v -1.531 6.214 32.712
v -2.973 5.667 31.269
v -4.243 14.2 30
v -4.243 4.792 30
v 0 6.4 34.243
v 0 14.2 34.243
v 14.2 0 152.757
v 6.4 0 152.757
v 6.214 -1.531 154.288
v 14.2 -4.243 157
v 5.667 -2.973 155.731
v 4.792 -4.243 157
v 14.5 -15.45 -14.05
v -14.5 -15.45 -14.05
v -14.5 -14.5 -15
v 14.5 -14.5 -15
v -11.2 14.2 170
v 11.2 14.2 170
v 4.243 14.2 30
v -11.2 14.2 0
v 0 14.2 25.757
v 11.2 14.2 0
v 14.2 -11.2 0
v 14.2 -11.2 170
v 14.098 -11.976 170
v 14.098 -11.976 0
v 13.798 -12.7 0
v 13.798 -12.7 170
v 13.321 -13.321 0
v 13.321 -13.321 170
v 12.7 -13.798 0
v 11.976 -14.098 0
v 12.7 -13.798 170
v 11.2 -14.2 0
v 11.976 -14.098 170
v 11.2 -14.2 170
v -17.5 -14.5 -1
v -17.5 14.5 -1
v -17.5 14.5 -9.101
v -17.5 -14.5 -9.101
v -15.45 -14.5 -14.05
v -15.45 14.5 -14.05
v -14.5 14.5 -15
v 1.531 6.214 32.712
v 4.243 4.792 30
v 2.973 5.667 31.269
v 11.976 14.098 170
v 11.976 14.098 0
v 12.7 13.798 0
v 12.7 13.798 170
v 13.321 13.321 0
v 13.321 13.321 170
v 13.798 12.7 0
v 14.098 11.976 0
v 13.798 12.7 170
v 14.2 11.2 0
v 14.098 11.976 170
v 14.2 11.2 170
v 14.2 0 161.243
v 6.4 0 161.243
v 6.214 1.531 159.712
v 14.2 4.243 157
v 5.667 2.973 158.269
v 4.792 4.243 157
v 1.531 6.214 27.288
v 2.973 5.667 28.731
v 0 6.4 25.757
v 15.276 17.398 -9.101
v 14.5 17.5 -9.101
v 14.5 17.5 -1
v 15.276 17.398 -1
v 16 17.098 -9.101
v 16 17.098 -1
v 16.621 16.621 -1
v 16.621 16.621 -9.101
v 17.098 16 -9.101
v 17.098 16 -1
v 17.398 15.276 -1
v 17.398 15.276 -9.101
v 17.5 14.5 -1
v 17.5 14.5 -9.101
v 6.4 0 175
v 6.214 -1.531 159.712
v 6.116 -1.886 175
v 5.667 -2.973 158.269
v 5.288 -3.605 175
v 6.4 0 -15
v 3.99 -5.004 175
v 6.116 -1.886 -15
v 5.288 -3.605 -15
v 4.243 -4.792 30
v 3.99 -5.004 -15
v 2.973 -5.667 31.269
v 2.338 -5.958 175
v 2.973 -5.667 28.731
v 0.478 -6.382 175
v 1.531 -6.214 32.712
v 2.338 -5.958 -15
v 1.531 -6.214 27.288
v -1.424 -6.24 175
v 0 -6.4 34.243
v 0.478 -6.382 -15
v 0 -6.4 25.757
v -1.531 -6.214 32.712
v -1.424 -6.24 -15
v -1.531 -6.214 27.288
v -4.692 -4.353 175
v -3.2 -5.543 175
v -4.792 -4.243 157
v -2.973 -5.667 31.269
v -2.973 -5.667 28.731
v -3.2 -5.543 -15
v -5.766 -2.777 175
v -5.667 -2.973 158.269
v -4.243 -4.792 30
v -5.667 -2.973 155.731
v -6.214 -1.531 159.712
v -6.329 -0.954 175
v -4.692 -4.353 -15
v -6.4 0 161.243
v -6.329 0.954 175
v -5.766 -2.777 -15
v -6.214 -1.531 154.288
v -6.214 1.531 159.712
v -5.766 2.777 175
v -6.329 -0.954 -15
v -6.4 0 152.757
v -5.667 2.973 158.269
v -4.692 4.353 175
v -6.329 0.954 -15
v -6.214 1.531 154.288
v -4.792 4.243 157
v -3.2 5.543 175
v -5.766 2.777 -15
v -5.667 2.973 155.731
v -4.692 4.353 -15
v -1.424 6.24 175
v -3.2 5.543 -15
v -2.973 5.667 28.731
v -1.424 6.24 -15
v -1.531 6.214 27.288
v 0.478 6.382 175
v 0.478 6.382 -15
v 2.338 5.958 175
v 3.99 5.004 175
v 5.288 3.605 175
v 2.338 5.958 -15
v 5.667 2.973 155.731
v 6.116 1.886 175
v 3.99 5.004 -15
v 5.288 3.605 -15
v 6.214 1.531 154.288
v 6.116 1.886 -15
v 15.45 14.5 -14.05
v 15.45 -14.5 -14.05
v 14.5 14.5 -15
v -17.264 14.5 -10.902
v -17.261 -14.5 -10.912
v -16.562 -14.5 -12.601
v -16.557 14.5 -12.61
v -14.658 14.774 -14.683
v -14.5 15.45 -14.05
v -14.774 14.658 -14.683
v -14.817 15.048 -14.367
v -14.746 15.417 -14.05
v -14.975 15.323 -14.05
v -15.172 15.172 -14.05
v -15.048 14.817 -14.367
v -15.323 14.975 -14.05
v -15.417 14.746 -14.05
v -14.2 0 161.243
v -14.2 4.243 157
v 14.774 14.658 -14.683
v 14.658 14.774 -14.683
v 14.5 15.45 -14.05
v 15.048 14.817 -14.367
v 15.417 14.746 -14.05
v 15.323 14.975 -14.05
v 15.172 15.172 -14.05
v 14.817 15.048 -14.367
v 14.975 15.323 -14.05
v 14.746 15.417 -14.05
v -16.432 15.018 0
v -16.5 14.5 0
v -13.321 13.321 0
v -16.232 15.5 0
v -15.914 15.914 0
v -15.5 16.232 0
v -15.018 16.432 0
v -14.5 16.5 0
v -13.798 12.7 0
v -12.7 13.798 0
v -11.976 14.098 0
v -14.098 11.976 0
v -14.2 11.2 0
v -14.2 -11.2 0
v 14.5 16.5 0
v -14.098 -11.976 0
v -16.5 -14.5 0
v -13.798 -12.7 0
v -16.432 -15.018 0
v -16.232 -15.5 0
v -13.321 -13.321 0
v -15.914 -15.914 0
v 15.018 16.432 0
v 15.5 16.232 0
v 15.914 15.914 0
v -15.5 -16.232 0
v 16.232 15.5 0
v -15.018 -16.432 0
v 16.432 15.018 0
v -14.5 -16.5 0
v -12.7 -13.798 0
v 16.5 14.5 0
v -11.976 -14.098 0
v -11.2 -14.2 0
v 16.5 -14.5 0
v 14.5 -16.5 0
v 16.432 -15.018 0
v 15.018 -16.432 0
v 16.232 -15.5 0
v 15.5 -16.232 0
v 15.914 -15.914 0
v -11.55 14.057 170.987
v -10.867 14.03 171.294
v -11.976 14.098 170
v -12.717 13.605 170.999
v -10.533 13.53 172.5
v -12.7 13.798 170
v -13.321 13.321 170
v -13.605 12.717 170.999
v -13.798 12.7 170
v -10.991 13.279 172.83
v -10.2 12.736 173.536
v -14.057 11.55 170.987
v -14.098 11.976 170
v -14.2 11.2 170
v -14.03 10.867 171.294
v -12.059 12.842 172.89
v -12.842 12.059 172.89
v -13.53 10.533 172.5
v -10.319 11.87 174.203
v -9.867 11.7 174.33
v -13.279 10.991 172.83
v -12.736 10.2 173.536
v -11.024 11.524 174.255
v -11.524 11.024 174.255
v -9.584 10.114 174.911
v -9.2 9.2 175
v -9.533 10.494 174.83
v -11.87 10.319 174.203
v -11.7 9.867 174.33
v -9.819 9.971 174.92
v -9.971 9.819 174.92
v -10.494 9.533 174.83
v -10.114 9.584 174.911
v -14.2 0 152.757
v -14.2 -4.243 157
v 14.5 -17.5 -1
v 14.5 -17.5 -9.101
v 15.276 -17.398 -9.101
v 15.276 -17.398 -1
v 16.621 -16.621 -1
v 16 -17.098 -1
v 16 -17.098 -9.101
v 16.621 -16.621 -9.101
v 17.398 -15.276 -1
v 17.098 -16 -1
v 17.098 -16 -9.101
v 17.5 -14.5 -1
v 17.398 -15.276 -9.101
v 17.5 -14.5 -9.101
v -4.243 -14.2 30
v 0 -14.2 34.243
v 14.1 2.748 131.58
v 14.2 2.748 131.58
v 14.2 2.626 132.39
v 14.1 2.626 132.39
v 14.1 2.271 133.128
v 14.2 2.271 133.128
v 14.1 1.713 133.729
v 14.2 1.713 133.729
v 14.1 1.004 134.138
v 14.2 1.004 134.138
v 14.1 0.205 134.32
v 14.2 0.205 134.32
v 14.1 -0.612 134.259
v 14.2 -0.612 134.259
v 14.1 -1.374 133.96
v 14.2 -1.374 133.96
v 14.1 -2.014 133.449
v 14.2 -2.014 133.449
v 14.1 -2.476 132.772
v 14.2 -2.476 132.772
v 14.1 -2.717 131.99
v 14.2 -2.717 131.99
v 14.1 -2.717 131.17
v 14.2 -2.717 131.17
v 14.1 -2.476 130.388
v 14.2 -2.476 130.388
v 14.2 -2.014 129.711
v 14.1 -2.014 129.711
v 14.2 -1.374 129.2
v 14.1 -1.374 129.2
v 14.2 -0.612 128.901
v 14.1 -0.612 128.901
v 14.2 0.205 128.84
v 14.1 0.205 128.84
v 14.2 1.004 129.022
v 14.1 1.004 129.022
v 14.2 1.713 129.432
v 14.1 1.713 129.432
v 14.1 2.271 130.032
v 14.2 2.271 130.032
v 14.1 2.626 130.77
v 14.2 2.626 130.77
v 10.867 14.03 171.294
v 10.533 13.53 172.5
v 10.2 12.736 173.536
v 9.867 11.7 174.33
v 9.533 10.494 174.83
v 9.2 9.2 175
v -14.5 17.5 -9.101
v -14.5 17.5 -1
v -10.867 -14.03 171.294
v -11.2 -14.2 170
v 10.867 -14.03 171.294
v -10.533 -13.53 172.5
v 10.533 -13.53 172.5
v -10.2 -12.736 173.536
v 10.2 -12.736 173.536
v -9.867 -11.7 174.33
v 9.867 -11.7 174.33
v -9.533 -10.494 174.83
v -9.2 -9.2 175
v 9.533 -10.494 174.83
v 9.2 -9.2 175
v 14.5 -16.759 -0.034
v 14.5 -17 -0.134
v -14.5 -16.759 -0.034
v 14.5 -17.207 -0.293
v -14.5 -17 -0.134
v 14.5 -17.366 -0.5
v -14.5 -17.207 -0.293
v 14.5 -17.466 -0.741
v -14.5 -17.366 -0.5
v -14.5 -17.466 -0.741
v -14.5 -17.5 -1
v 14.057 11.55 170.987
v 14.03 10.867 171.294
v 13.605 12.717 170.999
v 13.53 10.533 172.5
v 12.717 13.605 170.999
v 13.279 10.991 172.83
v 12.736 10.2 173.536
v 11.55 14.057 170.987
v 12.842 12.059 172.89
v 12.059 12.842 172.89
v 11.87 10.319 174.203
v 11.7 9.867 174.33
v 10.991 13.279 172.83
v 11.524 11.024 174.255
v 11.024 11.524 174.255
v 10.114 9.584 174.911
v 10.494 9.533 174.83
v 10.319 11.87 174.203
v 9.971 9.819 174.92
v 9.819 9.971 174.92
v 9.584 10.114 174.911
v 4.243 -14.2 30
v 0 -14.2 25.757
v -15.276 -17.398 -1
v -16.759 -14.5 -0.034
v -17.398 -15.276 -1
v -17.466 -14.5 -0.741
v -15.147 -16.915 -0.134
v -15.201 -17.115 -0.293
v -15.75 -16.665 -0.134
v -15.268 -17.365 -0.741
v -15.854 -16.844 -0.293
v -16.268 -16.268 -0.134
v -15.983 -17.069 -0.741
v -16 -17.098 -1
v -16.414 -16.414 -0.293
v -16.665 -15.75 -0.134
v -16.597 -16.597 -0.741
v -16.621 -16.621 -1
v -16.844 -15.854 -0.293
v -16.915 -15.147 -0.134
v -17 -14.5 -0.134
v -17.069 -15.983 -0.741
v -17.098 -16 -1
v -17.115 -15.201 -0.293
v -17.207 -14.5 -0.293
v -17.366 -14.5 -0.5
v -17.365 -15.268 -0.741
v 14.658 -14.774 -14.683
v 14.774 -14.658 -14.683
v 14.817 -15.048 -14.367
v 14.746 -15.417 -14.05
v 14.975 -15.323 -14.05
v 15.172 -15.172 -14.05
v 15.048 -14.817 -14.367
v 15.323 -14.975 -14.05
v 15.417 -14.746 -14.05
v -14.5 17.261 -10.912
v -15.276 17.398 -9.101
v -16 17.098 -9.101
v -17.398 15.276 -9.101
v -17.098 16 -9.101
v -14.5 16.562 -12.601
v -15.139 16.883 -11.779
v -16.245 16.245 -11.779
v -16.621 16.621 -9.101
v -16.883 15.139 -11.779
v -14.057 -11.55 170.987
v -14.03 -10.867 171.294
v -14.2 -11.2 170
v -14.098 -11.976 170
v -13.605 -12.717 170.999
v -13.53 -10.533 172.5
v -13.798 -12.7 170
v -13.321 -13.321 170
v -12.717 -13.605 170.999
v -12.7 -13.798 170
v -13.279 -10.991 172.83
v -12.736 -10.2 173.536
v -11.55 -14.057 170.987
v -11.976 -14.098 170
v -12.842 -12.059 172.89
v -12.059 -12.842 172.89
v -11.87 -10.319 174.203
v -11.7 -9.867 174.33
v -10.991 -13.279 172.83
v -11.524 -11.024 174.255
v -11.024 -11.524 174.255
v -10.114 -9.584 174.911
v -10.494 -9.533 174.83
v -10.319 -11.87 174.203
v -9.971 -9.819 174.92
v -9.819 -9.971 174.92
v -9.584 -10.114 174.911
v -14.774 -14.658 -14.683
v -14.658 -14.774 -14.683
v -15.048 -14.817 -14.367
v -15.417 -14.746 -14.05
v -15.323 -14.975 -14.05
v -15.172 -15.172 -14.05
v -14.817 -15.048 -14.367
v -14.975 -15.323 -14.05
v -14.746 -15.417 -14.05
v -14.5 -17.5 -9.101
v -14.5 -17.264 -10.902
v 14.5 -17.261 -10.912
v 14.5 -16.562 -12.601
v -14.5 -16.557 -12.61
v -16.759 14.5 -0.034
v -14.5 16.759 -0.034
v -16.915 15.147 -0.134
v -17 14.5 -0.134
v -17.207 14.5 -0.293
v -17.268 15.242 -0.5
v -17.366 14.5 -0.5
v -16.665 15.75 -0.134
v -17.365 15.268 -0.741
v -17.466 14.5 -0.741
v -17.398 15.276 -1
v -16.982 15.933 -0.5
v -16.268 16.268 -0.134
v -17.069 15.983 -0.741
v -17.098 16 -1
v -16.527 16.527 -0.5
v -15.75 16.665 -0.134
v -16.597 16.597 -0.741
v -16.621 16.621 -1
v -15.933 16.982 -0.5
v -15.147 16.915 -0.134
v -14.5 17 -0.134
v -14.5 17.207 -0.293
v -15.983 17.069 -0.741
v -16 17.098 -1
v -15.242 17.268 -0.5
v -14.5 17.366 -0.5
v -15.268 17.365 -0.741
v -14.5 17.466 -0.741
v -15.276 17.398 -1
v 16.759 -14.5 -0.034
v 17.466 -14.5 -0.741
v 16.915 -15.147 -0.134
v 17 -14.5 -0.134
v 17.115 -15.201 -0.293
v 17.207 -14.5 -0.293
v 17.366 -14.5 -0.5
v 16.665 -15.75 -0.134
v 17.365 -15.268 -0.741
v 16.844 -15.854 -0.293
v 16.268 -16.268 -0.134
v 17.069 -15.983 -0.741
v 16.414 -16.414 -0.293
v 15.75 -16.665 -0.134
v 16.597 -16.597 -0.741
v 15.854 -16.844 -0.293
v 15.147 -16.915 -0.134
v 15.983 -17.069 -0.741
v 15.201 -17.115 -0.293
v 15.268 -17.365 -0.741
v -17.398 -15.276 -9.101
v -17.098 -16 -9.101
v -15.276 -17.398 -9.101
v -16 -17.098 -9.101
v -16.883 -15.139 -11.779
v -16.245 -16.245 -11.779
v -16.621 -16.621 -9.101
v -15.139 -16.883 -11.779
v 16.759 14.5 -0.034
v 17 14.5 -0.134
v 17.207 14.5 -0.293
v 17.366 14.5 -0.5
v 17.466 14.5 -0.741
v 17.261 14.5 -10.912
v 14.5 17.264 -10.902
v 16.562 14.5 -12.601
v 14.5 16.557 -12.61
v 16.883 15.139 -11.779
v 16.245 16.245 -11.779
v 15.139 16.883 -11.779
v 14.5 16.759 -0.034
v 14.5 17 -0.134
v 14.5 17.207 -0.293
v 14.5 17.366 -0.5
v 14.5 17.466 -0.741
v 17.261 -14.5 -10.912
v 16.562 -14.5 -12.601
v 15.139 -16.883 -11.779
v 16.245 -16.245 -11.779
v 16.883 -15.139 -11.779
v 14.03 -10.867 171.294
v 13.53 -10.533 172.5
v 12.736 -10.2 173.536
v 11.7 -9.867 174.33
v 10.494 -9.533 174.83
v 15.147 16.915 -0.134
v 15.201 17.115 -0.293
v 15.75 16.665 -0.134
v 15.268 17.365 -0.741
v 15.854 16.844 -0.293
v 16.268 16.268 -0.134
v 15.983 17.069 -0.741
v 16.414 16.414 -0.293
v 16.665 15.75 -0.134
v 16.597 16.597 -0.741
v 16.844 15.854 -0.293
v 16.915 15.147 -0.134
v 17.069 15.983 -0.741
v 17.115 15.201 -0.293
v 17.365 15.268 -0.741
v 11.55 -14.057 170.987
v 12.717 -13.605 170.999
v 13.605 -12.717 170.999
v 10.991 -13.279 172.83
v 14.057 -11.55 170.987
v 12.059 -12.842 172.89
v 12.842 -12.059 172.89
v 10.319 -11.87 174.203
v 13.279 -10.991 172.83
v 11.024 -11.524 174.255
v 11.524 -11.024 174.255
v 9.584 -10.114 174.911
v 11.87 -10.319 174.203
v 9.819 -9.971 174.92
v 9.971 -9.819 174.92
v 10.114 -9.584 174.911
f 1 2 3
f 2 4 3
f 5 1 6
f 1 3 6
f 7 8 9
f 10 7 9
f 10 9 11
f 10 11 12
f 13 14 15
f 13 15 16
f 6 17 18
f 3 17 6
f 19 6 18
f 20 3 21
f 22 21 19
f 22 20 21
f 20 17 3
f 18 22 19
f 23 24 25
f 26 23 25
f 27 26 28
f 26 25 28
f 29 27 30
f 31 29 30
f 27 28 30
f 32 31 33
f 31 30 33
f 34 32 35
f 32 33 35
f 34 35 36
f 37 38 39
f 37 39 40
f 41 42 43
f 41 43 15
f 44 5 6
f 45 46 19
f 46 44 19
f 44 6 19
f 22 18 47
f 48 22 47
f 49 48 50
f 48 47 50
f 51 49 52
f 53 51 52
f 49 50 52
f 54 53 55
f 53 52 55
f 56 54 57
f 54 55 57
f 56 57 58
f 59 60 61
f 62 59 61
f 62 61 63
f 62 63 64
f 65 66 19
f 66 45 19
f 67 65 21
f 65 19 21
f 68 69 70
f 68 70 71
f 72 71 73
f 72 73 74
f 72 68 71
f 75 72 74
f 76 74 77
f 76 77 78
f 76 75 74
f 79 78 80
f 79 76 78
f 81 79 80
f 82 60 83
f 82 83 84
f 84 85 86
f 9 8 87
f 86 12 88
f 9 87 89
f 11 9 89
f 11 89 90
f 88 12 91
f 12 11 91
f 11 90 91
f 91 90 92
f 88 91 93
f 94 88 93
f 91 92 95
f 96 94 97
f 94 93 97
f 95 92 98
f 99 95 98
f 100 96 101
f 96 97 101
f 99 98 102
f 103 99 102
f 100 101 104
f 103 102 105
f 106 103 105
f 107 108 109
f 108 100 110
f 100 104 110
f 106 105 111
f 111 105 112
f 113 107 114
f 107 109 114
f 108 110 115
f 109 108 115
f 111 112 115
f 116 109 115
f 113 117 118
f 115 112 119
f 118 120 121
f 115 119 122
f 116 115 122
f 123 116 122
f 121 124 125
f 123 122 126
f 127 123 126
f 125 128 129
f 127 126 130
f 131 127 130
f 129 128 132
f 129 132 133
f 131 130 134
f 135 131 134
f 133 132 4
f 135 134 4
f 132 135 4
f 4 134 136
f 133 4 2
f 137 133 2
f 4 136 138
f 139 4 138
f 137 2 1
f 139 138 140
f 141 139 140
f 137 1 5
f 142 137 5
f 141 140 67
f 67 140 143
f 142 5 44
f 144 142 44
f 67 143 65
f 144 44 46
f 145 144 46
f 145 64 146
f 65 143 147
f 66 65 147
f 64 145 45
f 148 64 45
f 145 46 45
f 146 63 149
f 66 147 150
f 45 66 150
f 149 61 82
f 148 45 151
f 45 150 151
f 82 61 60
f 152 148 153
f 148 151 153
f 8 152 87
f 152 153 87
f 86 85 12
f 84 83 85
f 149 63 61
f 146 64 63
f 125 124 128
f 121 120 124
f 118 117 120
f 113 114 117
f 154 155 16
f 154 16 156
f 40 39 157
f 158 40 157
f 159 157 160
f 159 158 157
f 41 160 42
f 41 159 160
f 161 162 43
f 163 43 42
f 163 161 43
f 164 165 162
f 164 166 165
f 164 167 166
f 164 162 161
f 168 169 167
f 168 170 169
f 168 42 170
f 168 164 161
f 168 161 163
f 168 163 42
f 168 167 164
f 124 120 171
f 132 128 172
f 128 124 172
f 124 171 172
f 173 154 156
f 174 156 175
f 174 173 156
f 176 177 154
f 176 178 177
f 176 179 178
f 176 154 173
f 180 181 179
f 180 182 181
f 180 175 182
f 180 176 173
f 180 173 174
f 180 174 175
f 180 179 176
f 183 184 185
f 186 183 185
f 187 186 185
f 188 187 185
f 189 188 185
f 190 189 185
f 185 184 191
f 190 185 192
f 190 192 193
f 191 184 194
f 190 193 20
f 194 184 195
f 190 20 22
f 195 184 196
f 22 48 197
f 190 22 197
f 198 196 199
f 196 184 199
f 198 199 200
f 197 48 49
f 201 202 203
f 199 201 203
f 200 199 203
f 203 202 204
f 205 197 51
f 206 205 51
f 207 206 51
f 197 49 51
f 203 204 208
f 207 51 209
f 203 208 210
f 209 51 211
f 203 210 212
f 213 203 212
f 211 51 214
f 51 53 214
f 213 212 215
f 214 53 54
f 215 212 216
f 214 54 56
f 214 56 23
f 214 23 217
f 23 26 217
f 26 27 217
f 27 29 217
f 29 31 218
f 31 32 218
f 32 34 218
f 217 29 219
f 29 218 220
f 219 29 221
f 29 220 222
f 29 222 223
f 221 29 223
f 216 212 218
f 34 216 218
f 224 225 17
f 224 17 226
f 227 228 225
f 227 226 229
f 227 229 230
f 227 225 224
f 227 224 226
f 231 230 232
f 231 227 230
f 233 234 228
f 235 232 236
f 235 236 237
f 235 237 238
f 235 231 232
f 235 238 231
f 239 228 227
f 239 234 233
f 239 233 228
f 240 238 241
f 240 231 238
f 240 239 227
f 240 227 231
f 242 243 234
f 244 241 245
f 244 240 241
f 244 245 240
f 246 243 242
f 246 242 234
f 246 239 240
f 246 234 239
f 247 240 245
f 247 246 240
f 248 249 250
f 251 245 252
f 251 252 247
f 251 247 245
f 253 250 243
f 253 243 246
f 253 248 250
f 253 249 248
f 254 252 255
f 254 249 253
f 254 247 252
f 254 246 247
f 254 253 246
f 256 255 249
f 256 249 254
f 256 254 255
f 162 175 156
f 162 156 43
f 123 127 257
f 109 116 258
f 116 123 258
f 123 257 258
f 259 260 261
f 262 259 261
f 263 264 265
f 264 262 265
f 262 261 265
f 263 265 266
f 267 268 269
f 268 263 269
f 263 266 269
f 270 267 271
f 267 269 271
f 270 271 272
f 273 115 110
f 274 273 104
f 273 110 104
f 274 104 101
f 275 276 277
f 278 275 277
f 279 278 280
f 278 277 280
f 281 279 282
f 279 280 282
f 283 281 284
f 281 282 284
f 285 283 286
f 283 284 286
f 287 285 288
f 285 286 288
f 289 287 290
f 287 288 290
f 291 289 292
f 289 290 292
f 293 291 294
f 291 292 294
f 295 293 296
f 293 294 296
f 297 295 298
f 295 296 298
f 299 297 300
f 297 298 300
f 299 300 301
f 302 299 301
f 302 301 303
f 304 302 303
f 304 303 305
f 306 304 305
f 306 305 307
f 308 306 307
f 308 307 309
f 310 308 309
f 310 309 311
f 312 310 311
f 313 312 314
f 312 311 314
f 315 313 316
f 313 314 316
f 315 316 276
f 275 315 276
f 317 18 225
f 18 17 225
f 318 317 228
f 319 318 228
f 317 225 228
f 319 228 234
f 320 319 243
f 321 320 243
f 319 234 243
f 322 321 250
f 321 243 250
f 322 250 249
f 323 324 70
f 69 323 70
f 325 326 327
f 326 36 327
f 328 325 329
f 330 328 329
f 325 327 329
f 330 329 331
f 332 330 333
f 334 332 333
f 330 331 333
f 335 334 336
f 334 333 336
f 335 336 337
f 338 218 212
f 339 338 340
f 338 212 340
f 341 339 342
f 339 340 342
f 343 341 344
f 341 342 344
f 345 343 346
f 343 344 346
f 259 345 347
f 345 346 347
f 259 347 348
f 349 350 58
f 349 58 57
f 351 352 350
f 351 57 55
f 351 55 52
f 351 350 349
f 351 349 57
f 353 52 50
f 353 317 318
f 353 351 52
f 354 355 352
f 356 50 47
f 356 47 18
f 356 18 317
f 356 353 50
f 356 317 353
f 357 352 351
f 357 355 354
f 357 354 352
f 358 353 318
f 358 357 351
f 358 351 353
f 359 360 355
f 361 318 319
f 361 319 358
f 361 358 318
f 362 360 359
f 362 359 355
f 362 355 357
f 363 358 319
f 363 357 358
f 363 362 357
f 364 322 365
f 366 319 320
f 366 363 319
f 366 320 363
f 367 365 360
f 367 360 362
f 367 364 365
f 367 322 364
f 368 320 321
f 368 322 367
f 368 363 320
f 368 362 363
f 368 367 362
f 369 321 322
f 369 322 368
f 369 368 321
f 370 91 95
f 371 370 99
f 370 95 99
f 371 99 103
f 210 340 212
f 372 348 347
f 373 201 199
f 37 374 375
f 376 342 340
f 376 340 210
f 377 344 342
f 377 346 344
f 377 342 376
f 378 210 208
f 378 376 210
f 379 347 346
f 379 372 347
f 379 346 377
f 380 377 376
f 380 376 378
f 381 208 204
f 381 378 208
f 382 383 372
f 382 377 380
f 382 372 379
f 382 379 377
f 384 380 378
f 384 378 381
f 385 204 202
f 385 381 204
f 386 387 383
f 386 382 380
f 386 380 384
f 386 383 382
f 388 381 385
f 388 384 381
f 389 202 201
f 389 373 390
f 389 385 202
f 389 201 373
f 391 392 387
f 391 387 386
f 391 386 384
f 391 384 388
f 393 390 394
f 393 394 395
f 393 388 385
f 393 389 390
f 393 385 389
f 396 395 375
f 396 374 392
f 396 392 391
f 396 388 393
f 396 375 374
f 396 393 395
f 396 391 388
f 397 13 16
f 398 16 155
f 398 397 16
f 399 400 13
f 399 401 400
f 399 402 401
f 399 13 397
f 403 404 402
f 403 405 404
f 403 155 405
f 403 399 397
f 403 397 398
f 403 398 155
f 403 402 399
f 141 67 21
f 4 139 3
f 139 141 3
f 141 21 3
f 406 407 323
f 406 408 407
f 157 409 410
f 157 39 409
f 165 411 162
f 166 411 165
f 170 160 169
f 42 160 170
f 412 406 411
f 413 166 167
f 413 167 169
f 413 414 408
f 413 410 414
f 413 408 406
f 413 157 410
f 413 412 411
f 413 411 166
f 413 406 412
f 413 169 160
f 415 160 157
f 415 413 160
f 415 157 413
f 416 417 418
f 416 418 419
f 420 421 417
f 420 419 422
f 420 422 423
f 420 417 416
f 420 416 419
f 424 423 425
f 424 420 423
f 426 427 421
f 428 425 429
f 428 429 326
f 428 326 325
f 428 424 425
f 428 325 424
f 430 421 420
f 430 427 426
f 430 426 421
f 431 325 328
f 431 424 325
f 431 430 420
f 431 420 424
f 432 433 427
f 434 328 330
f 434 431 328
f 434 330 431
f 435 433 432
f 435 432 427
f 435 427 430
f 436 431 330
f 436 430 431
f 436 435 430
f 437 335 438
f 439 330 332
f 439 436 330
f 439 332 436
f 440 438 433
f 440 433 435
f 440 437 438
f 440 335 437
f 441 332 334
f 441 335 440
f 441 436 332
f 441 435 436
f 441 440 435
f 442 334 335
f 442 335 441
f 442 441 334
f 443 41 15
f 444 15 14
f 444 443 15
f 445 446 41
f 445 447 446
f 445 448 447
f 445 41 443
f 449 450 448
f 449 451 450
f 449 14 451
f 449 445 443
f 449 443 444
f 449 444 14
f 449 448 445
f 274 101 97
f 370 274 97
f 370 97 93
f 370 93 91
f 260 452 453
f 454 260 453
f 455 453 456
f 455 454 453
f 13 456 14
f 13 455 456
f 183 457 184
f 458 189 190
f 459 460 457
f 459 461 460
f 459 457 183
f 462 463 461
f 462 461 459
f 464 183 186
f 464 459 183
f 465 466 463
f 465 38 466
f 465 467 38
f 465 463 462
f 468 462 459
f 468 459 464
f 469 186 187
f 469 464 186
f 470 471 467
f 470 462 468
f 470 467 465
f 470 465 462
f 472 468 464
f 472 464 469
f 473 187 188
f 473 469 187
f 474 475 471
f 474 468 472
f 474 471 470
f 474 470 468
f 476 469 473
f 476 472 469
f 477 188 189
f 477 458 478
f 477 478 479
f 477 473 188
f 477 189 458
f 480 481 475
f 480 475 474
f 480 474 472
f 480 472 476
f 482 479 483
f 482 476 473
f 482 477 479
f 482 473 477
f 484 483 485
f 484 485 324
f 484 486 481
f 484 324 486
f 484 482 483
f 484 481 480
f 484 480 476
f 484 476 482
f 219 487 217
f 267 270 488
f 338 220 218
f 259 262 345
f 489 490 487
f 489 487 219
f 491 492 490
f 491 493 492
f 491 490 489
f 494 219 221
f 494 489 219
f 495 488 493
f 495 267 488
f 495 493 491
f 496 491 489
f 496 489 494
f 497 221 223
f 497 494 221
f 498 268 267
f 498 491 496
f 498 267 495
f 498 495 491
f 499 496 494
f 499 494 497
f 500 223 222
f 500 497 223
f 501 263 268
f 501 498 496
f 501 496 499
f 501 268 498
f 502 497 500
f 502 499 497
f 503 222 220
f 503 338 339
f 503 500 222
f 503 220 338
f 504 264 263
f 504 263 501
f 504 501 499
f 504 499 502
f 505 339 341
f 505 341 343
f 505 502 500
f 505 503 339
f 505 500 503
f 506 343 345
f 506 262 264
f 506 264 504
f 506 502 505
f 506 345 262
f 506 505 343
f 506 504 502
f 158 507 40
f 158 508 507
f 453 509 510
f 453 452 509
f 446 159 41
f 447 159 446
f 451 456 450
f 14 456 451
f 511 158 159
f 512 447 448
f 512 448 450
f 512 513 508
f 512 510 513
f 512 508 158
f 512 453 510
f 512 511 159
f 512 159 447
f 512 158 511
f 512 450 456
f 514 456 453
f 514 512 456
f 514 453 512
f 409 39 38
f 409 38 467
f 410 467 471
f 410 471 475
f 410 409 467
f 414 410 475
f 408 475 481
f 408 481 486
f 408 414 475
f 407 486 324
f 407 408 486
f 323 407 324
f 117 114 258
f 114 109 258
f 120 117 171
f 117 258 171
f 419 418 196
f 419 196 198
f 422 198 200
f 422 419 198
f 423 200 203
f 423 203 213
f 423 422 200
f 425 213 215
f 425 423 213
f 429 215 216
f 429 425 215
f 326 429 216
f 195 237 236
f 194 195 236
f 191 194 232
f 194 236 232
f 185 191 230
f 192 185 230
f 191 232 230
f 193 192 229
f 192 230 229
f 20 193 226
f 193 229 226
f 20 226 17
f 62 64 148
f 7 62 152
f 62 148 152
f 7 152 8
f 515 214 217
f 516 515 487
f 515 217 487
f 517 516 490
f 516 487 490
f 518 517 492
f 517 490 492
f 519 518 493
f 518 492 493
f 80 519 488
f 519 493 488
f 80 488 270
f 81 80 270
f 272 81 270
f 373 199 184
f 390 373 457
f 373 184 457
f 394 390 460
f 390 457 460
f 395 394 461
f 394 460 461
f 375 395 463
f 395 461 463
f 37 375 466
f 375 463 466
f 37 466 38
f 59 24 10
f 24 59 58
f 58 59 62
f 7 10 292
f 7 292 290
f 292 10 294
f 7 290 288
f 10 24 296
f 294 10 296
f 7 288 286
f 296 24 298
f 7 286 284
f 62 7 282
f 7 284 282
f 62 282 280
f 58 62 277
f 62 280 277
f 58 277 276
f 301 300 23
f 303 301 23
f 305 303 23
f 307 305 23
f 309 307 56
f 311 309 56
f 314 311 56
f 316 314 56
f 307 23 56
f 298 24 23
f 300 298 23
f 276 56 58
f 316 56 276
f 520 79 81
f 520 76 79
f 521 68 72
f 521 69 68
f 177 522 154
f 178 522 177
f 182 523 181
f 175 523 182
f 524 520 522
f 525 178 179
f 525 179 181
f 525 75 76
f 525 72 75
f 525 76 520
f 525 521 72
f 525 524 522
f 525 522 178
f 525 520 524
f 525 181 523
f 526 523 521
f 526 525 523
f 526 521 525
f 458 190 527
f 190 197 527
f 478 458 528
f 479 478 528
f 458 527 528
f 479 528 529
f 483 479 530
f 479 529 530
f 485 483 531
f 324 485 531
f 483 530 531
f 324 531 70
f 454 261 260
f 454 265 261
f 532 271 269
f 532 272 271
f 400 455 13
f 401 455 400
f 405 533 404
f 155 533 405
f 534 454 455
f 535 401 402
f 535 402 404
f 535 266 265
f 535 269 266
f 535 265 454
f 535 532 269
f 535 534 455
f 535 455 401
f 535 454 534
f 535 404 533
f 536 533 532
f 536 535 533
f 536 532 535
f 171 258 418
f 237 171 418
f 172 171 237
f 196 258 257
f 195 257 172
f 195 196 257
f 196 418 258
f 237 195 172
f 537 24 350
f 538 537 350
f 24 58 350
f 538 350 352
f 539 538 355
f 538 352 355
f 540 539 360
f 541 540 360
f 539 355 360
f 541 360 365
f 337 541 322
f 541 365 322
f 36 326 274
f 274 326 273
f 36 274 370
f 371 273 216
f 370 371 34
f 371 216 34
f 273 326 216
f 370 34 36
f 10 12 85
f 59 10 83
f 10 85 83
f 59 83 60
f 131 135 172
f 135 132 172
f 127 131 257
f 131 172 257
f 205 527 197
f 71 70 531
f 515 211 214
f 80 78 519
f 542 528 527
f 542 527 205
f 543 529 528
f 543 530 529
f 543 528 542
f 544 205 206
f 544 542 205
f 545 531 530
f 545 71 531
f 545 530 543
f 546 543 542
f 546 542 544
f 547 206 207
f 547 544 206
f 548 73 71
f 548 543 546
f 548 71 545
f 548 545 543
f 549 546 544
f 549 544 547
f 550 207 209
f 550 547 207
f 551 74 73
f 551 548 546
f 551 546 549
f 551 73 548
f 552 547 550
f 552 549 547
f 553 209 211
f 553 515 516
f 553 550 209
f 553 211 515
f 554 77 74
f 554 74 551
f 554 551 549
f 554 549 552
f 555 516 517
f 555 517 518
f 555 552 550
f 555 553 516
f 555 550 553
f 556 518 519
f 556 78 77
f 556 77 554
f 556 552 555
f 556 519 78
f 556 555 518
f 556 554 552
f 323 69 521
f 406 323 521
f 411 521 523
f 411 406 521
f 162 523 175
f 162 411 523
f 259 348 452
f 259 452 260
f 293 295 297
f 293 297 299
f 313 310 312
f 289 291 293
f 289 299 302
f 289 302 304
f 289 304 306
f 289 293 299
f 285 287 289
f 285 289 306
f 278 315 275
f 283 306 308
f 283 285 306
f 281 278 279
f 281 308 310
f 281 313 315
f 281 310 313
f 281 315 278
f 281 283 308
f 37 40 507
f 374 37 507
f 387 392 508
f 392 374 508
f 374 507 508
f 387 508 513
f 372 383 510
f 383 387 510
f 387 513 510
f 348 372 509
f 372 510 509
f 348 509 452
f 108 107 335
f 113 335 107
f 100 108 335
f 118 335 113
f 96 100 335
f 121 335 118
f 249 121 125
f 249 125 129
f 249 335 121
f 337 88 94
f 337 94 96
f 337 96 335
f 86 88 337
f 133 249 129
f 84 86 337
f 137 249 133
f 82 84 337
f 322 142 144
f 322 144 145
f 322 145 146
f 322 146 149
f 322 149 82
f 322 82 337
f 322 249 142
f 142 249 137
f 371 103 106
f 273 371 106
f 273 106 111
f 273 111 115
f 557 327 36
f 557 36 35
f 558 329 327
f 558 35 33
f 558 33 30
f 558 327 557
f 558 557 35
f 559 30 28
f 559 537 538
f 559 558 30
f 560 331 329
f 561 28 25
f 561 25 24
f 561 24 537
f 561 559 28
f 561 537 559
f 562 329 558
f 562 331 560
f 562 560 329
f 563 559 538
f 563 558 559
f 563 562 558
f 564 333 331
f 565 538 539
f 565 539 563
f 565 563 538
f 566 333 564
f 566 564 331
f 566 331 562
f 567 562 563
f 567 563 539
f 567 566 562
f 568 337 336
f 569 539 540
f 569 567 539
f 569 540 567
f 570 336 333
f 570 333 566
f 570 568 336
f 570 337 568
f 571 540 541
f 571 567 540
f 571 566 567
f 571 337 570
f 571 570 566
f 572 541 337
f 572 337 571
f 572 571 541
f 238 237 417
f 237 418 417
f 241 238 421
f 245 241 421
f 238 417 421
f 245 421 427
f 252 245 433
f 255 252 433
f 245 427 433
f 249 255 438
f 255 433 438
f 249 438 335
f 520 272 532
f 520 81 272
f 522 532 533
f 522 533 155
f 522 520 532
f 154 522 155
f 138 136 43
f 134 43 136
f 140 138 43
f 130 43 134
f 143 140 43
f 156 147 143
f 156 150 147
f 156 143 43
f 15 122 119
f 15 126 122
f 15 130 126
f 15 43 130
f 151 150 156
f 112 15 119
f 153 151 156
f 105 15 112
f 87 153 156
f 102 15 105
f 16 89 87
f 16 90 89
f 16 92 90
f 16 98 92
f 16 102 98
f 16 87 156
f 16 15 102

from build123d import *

# Parameters (mm, degrees)
SKETCH_W          = 28.4
SKETCH_H          = 28.4
PAD_DEPTH         = 175
SKETCH001_R       = 6.4
POCKET_DEPTH      = 175.001
POCKET_DEPTH_BACK = -0.001
SKETCH002_R       = 2.74807
POCKET001_DEPTH   = 0.1
SKETCH003_W       = 35
SKETCH003_H       = 35
PAD001_DEPTH      = 15
FILLET_R          = 3
CHAMFER_SIZE      = 3
FILLET001_R       = 3
FILLET002_R       = 5
FILLET003_R       = 7
FILLET004_R       = 1
POCKET002_DEPTH   = 31.701
POCKET003_DEPTH   = 31.701
SKETCH006_R       = 6.4
POCKET004_DEPTH   = 190.001


with BuildPart() as part:
    # Sketch → Pad (new body)
    with BuildSketch(Plane.XY):
        Rectangle(SKETCH_W, SKETCH_H)
    extrude(amount=PAD_DEPTH)

    # Sketch001 → Pocket (cut, two sides)
    with BuildSketch(Plane(origin=(0, 0, 0), x_dir=(1, 0, 0), z_dir=(0, 0, -1))) as pocket_sk:
        Circle(SKETCH001_R)
    extrude(amount=-POCKET_DEPTH, mode=Mode.SUBTRACT)
    extrude(pocket_sk.sketch, amount=-POCKET_DEPTH_BACK, mode=Mode.SUBTRACT)

    # Sketch002 → Pocket001 (cut)
    with BuildSketch(Plane.YZ.offset(14.2)):
        with Locations((0, 131.580032)):
            Circle(SKETCH002_R)
    extrude(amount=-POCKET001_DEPTH, mode=Mode.SUBTRACT)

    # Sketch003 → Pad001 (new body)
    with BuildSketch(Plane(origin=(0, 0, 0), x_dir=(1, 0, 0), z_dir=(0, 0, -1))):
        Rectangle(SKETCH003_W, SKETCH003_H)
    extrude(amount=PAD001_DEPTH)

    # Fillet
    fillet_edges = [part.edges().sort_by_distance(p)[0] for p in [
        (17.5, -17.5, -7.5),
        (-17.5, -17.5, -7.5),
        (17.5, 17.5, -7.5),
        (-17.5, 17.5, -7.5),
    ]]
    fillet(fillet_edges, radius=FILLET_R)

    # Chamfer
    chamfer_edges = [part.edges().sort_by_distance(p)[0] for p in [
        (0, -17.5, -15),
        (-16.62132, -16.62132, -15),
        (16.62132, -16.62132, -15),
        (-17.5, 0, -15),
        (17.5, 0, -15),
        (-16.62132, 16.62132, -15),
        (16.62132, 16.62132, -15),
        (0, 17.5, -15),
    ]]
    chamfer(chamfer_edges, length=CHAMFER_SIZE)

    # Fillet001
    fillet001_edges = [part.edges().sort_by_distance(p)[0] for p in [
        (14.2, -14.2, 87.5),
        (14.2, 14.2, 87.5),
        (-14.2, 14.2, 87.5),
        (-14.2, -14.2, 87.5),
    ]]
    fillet(fillet001_edges, radius=FILLET001_R)

    # Fillet002
    fillet002_edges = [part.edges().sort_by_distance(p)[0] for p in [
        (14.2, 0, 175),
    ]]
    fillet(fillet002_edges, radius=FILLET002_R)

    # Fillet003
    fillet003_edges = [part.edges().sort_by_distance(p)[0] for p in [
        (17.5, 0, -12),
    ]]
    fillet(fillet003_edges, radius=FILLET003_R)

    # Fillet004
    fillet004_edges = [part.edges().sort_by_distance(p)[0] for p in [
        (0, 17.5, 0),
    ]]
    fillet(fillet004_edges, radius=FILLET004_R)

    # Sketch004 → Pocket002 (cut, through all)
    with BuildSketch(Plane(origin=(0, 14.2, 0), x_dir=(-1, 0, 0), z_dir=(0, 1, 0))):
        Polygon((0, 34.242641), (-4.242641, 30), (0, 25.757359), (4.242641, 30), align=None)
    extrude(amount=-POCKET002_DEPTH, mode=Mode.SUBTRACT)

    # Sketch005 → Pocket003 (cut, through all)
    with BuildSketch(Plane(origin=(-14.2, 0, 0), x_dir=(0, -1, 0), z_dir=(-1, 0, 0))):
        Polygon((0, 161.242641), (-4.242641, 157), (0, 152.757359), (4.242641, 157), align=None)
    extrude(amount=-POCKET003_DEPTH, mode=Mode.SUBTRACT)

    # Sketch006 → Pocket004 (cut, through all)
    with BuildSketch(Plane(origin=(0, 0, -15), x_dir=(1, 0, 0), z_dir=(0, 0, -1))):
        Circle(SKETCH006_R)
    extrude(amount=-POCKET004_DEPTH, mode=Mode.SUBTRACT)


solid = part.part
